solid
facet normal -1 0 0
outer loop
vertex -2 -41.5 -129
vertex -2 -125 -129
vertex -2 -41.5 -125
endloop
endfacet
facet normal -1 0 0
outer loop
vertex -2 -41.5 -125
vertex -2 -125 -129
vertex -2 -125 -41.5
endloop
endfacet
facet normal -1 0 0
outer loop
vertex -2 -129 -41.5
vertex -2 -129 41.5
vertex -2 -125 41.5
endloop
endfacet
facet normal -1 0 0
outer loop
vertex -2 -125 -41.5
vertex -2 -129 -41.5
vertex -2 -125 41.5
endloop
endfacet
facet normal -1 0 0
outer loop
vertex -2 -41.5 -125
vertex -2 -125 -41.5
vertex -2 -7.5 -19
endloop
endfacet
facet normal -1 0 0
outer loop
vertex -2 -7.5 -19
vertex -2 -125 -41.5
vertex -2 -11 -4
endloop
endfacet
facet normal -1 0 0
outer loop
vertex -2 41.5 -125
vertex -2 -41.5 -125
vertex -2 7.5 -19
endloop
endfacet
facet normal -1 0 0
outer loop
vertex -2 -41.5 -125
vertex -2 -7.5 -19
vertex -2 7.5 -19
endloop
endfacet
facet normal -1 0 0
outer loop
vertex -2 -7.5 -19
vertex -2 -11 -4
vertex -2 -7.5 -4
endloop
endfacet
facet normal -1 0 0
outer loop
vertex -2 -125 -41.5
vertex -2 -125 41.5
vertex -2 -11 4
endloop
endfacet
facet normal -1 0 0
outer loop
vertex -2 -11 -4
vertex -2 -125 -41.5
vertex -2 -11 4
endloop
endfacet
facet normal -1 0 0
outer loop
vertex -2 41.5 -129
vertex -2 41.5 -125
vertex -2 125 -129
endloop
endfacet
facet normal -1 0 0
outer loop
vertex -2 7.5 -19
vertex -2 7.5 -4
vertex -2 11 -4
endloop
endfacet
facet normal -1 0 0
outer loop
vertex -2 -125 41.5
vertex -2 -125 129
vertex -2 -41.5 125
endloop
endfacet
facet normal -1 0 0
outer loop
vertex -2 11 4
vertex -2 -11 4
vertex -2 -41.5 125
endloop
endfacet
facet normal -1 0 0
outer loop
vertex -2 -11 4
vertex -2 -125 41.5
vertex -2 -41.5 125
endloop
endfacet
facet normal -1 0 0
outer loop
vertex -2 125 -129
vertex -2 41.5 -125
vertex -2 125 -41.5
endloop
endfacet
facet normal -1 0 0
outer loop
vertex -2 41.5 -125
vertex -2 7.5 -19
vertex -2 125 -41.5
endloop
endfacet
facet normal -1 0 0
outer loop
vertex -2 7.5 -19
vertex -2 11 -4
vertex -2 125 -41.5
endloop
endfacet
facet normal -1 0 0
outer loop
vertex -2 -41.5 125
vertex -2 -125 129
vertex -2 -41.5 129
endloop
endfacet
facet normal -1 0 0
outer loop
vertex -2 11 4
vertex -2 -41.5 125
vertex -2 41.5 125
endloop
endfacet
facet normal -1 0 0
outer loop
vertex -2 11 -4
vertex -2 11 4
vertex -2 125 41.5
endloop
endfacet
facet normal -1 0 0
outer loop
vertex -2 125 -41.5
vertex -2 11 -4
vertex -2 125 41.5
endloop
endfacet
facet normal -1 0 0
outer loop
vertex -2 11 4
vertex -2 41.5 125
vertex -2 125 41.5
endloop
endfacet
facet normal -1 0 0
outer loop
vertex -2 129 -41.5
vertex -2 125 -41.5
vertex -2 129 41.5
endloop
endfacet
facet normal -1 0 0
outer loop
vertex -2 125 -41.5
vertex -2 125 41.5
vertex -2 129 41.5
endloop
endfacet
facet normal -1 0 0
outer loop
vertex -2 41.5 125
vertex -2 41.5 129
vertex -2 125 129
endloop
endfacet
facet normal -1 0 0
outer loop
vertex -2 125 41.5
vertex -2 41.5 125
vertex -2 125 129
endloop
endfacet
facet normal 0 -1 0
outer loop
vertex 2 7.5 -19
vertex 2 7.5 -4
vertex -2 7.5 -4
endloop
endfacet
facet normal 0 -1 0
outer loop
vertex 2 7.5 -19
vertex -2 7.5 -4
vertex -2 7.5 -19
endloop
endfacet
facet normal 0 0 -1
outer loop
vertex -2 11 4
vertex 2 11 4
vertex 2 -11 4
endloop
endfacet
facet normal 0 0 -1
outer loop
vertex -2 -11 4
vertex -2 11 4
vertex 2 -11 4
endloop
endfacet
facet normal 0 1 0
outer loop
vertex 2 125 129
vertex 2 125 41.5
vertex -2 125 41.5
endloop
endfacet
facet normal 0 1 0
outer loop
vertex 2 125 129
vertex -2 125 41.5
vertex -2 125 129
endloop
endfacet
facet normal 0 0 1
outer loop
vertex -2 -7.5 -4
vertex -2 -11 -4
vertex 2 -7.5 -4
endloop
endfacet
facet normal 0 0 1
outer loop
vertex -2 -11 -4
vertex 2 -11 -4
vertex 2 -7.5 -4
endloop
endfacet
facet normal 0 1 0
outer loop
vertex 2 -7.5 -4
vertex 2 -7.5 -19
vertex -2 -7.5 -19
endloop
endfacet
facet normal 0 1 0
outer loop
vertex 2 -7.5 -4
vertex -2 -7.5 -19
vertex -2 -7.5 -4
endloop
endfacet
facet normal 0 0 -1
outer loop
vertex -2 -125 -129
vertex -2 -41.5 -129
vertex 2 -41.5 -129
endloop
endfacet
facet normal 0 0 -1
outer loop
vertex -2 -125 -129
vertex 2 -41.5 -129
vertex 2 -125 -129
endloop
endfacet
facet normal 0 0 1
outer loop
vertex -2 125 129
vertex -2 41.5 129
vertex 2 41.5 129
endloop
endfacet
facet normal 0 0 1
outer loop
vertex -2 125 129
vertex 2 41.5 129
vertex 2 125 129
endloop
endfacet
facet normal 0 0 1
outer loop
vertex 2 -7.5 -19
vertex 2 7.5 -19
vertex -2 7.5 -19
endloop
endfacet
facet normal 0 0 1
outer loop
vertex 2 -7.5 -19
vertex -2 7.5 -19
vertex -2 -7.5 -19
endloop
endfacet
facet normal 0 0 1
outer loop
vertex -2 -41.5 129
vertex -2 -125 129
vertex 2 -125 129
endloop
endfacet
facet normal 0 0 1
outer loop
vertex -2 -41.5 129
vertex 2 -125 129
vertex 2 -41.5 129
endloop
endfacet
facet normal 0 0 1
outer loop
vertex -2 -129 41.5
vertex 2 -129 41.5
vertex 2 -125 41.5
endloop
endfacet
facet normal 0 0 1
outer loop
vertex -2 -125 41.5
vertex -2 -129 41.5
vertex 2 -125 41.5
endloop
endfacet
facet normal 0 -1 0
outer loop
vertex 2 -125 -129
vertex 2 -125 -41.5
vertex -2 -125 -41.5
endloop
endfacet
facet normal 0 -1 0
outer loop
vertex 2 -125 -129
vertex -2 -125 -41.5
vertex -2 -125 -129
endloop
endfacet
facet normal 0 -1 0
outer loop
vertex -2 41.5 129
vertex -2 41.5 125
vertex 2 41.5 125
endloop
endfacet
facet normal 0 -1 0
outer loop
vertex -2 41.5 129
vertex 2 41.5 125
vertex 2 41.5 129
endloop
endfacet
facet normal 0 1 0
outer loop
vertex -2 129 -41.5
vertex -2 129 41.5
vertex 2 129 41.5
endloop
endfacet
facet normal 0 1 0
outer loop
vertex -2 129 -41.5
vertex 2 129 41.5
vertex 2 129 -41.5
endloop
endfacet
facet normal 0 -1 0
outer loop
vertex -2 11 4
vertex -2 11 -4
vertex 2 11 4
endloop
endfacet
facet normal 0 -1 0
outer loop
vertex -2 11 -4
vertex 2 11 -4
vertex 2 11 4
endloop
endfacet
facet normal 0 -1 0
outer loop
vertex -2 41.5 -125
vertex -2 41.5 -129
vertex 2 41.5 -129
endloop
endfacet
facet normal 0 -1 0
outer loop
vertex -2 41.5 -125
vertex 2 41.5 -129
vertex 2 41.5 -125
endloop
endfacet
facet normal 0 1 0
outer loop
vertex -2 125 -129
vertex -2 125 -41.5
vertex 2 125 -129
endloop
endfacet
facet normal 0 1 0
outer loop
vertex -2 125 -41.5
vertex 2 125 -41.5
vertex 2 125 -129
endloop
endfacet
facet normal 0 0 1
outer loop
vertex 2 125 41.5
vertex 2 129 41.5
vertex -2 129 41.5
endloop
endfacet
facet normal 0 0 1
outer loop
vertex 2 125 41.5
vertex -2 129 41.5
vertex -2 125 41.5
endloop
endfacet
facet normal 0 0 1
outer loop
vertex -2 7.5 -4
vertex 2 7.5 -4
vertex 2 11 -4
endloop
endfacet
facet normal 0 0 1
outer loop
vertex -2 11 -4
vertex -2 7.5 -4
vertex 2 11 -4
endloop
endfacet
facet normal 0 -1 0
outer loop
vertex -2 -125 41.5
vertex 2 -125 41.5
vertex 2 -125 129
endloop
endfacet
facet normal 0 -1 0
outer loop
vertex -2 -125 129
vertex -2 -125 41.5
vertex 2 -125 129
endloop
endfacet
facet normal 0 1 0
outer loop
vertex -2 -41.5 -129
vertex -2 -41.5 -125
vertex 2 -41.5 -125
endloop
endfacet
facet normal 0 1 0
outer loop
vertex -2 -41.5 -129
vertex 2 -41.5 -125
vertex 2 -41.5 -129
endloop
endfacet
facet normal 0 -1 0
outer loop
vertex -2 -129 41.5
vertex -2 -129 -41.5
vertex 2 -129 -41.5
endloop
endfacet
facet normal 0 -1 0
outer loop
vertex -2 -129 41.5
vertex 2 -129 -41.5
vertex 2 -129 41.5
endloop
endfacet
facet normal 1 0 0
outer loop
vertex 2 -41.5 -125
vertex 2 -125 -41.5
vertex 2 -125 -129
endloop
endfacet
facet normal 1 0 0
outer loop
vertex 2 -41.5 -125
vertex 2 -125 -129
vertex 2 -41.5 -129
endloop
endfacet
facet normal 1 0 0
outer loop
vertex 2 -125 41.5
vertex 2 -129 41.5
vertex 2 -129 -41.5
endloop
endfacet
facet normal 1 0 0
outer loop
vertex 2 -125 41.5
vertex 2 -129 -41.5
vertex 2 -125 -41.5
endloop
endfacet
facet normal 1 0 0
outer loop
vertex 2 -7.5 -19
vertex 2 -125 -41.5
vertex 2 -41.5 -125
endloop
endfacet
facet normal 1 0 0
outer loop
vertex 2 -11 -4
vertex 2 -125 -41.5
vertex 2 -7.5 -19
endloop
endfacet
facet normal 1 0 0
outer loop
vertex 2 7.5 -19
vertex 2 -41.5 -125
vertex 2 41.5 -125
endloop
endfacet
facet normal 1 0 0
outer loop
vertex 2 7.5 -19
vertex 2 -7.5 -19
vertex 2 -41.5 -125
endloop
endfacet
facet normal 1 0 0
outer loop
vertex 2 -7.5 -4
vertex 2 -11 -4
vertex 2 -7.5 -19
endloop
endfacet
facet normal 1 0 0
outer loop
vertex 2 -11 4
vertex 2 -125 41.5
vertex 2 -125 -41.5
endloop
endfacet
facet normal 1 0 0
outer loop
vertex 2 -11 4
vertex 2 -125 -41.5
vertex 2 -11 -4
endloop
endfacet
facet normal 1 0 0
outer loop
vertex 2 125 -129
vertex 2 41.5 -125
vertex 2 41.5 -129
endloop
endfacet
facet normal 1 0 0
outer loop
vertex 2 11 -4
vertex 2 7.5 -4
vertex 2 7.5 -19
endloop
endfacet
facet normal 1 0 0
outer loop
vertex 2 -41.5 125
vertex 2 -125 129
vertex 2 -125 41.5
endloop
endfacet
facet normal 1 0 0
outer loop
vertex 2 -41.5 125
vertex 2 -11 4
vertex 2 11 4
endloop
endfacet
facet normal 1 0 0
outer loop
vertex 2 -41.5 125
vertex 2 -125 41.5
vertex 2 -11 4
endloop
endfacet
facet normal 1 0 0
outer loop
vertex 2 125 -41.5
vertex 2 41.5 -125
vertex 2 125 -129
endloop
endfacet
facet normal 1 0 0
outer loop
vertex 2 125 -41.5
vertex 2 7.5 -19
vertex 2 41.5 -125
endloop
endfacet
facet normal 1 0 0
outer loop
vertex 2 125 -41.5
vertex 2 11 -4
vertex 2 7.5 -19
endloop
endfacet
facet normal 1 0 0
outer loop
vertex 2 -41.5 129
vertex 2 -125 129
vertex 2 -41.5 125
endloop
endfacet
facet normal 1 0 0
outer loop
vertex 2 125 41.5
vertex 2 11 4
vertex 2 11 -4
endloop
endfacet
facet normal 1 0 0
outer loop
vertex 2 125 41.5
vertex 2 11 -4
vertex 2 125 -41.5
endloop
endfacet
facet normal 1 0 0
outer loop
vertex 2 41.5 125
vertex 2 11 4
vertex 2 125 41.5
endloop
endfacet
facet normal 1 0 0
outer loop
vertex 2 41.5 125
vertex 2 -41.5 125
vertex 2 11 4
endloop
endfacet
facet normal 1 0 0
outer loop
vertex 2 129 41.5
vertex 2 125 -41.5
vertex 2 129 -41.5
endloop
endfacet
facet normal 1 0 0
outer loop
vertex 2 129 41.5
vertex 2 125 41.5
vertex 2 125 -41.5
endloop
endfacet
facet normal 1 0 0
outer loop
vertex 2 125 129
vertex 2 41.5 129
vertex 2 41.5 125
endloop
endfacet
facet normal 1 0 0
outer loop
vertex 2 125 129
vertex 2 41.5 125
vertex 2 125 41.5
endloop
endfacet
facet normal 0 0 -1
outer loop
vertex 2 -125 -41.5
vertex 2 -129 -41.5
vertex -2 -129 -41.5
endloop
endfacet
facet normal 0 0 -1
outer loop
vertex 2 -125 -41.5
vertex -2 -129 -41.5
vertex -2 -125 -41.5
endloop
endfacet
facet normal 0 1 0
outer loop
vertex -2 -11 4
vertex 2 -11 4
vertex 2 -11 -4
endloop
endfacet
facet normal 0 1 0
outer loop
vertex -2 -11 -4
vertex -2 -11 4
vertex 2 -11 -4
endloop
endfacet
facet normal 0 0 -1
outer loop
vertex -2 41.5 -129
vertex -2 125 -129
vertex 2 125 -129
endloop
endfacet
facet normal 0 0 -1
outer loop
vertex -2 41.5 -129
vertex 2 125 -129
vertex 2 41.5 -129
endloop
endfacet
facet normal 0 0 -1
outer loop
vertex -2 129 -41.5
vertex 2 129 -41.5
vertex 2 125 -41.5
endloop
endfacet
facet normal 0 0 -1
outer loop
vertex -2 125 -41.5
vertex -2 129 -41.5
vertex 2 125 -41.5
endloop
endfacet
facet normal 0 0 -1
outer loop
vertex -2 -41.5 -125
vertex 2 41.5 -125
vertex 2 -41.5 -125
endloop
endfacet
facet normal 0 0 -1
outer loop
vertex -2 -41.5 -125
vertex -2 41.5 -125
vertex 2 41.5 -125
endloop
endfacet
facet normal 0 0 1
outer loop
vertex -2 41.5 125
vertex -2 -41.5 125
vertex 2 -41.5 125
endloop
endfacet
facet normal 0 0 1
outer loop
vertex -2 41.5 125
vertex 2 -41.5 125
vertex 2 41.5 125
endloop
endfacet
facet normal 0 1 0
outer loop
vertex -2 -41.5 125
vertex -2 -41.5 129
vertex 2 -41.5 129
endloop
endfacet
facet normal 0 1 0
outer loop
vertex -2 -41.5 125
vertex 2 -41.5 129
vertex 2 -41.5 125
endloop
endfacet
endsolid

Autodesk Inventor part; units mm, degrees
ref_plane "YZ Plane" through (0, 0, 0) normal (1, 0, 0) x (0, 1, 0)
ref_plane "XZ Plane" through (0, 0, 0) normal (0, 1, 0) x (-1, 0, 0)
ref_plane "XY Plane" through (0, 0, 0) normal (0, 0, 1) x (1, 0, 0)
sketch "Esboço1" plane through (0, 0, 0) normal (1, 0, 0) x (0, 1, 0)
  line L0 (-129, 129) -> (129, 129)
  line L1 (129, 129) -> (129, -129)
  line L2 (129, -129) -> (-129, -129)
  line L3 (-129, -129) -> (-129, 129)
  line L4 (-129, 129) -> (129, -129) construction
  line L5 (129, 129) -> (-129, -129) construction
  point P0 (0, 0)
  dimension "d0" = 258
  dimension "d1" = 258
extrude "Extrusão1" add sketch "Esboço1" along normal mid plane 4
sketch "Esboço2" plane through (2, 0, 0) normal (1, 0, 0) x (0, 0, -1)
  line L0 (129, 129) -> (-129, 129) projected
  line L1 (-129, 129) -> (-41.5, 129)
  line L2 (-41.5, 129) -> (-41.5, 125)
  line L3 (-41.5, 125) -> (-129, 125)
  line L4 (-129, 125) -> (-129, 129)
  line L5 (129, 129) -> (41.5, 129)
  line L6 (41.5, 129) -> (41.5, 125)
  line L7 (41.5, 125) -> (129, 125)
  line L8 (129, 125) -> (129, 129)
  line L9 (-129, 129) -> (-129, -129) projected
  line L10 (-129, -129) -> (-41.5, -129)
  line L11 (-41.5, -129) -> (-41.5, -125)
  line L12 (-41.5, -125) -> (-129, -125)
  line L13 (-129, -125) -> (-129, -129)
  line L14 (129, -129) -> (129, 129) projected
  line L15 (129, -129) -> (41.5, -129)
  line L16 (41.5, -129) -> (41.5, -125)
  line L17 (41.5, -125) -> (129, -125)
  line L18 (129, -125) -> (129, -129)
  point P0 (0, 0)
  point P1 (129, -125)
  dimension "d4" = 87.5
  dimension "d5" = 4
  dimension "d6" = 87.5
  dimension "d7" = 4
  dimension "d8" = 83
  dimension "d9" = 87.5
  dimension "d10" = 4
  dimension "d11" = 87.5
  dimension "d12" = 4
  dimension "d13" = 83
extrude "Extrusão2" cut sketch "Esboço2" along normal through all both and the other way through all
sketch "Esboço3" plane through (2, 0, 0) normal (1, 0, 0) x (0, 0, -1)
  line L0 (-125, 41.5) -> (-133, 41.5)
  line L1 (-133, 41.5) -> (-133, -41.5)
  line L2 (-133, -41.5) -> (-125, -41.5)
  line L3 (-125, -41.5) -> (-125, 41.5)
  line L4 (-129, -125) -> (-129, 125) projected
  line L5 (-125, 41.5) -> (-133, -41.5) construction
  line L6 (-133, 41.5) -> (-125, -41.5) construction
  line L7 (125, -41.5) -> (133, -41.5)
  line L8 (133, -41.5) -> (133, 41.5)
  line L9 (133, 41.5) -> (125, 41.5)
  line L10 (125, 41.5) -> (125, -41.5)
  line L11 (129, 125) -> (129, -125) projected
  line L12 (125, -41.5) -> (133, 41.5) construction
  line L13 (133, -41.5) -> (125, 41.5) construction
  line L14 (-41.5, 125) -> (-129, 125) projected
  line L15 (-129, -125) -> (-41.5, -125) projected
  line L16 (129, 125) -> (41.5, 125) projected
  line L17 (41.5, -125) -> (129, -125) projected
  point P0 (0, 0)
  point P1 (-129, 0)
  point P2 (129, 0)
  dimension "d16" = 83
  dimension "d17" = 8
  dimension "d18" = 8
  dimension "d19" = 83
  dimension "d20" = 83.5
  dimension "d21" = 83.5
  dimension "d22" = 83.5
  dimension "d23" = 83.5
extrude "Extrusão3" cut sketch "Esboço3" along normal through all both and the other way through all
sketch "Esboço4" plane through (2, 0, 0) normal (1, 0, 0) x (0, 0, -1)
  line L0 (-4, -11) -> (4, -11)
  line L1 (4, -11) -> (4, 11)
  line L2 (4, 11) -> (-4, 11)
  line L3 (-4, 11) -> (-4, -11)
  line L4 (-4, -11) -> (4, 11) construction
  line L5 (4, -11) -> (-4, 11) construction
  point P0 (0, 0)
  dimension "d26" = 8
  dimension "d27" = 22
extrude "Extrusão4" cut sketch "Esboço4" against normal through all
sketch "Esboço5" plane through (2, 0, 0) normal (1, 0, 0) x (0, 0, -1)
  line L0 (4, 11) -> (4, 7.5)
  line L1 (4, -11) -> (4, 11) projected
  line L2 (4, 7.5) -> (19, 7.5)
  line L3 (19, 7.5) -> (19, -7.5)
  line L4 (19, -7.5) -> (4, -7.5)
  line L5 (4, -7.5) -> (4, 7.5)
  point P0 (0, 0)
  dimension "d30" = 3.5
  dimension "d32" = 15
extrude "Extrusão5" cut sketch "Esboço5" against normal through all
properties part number "TOPO POÇO"
